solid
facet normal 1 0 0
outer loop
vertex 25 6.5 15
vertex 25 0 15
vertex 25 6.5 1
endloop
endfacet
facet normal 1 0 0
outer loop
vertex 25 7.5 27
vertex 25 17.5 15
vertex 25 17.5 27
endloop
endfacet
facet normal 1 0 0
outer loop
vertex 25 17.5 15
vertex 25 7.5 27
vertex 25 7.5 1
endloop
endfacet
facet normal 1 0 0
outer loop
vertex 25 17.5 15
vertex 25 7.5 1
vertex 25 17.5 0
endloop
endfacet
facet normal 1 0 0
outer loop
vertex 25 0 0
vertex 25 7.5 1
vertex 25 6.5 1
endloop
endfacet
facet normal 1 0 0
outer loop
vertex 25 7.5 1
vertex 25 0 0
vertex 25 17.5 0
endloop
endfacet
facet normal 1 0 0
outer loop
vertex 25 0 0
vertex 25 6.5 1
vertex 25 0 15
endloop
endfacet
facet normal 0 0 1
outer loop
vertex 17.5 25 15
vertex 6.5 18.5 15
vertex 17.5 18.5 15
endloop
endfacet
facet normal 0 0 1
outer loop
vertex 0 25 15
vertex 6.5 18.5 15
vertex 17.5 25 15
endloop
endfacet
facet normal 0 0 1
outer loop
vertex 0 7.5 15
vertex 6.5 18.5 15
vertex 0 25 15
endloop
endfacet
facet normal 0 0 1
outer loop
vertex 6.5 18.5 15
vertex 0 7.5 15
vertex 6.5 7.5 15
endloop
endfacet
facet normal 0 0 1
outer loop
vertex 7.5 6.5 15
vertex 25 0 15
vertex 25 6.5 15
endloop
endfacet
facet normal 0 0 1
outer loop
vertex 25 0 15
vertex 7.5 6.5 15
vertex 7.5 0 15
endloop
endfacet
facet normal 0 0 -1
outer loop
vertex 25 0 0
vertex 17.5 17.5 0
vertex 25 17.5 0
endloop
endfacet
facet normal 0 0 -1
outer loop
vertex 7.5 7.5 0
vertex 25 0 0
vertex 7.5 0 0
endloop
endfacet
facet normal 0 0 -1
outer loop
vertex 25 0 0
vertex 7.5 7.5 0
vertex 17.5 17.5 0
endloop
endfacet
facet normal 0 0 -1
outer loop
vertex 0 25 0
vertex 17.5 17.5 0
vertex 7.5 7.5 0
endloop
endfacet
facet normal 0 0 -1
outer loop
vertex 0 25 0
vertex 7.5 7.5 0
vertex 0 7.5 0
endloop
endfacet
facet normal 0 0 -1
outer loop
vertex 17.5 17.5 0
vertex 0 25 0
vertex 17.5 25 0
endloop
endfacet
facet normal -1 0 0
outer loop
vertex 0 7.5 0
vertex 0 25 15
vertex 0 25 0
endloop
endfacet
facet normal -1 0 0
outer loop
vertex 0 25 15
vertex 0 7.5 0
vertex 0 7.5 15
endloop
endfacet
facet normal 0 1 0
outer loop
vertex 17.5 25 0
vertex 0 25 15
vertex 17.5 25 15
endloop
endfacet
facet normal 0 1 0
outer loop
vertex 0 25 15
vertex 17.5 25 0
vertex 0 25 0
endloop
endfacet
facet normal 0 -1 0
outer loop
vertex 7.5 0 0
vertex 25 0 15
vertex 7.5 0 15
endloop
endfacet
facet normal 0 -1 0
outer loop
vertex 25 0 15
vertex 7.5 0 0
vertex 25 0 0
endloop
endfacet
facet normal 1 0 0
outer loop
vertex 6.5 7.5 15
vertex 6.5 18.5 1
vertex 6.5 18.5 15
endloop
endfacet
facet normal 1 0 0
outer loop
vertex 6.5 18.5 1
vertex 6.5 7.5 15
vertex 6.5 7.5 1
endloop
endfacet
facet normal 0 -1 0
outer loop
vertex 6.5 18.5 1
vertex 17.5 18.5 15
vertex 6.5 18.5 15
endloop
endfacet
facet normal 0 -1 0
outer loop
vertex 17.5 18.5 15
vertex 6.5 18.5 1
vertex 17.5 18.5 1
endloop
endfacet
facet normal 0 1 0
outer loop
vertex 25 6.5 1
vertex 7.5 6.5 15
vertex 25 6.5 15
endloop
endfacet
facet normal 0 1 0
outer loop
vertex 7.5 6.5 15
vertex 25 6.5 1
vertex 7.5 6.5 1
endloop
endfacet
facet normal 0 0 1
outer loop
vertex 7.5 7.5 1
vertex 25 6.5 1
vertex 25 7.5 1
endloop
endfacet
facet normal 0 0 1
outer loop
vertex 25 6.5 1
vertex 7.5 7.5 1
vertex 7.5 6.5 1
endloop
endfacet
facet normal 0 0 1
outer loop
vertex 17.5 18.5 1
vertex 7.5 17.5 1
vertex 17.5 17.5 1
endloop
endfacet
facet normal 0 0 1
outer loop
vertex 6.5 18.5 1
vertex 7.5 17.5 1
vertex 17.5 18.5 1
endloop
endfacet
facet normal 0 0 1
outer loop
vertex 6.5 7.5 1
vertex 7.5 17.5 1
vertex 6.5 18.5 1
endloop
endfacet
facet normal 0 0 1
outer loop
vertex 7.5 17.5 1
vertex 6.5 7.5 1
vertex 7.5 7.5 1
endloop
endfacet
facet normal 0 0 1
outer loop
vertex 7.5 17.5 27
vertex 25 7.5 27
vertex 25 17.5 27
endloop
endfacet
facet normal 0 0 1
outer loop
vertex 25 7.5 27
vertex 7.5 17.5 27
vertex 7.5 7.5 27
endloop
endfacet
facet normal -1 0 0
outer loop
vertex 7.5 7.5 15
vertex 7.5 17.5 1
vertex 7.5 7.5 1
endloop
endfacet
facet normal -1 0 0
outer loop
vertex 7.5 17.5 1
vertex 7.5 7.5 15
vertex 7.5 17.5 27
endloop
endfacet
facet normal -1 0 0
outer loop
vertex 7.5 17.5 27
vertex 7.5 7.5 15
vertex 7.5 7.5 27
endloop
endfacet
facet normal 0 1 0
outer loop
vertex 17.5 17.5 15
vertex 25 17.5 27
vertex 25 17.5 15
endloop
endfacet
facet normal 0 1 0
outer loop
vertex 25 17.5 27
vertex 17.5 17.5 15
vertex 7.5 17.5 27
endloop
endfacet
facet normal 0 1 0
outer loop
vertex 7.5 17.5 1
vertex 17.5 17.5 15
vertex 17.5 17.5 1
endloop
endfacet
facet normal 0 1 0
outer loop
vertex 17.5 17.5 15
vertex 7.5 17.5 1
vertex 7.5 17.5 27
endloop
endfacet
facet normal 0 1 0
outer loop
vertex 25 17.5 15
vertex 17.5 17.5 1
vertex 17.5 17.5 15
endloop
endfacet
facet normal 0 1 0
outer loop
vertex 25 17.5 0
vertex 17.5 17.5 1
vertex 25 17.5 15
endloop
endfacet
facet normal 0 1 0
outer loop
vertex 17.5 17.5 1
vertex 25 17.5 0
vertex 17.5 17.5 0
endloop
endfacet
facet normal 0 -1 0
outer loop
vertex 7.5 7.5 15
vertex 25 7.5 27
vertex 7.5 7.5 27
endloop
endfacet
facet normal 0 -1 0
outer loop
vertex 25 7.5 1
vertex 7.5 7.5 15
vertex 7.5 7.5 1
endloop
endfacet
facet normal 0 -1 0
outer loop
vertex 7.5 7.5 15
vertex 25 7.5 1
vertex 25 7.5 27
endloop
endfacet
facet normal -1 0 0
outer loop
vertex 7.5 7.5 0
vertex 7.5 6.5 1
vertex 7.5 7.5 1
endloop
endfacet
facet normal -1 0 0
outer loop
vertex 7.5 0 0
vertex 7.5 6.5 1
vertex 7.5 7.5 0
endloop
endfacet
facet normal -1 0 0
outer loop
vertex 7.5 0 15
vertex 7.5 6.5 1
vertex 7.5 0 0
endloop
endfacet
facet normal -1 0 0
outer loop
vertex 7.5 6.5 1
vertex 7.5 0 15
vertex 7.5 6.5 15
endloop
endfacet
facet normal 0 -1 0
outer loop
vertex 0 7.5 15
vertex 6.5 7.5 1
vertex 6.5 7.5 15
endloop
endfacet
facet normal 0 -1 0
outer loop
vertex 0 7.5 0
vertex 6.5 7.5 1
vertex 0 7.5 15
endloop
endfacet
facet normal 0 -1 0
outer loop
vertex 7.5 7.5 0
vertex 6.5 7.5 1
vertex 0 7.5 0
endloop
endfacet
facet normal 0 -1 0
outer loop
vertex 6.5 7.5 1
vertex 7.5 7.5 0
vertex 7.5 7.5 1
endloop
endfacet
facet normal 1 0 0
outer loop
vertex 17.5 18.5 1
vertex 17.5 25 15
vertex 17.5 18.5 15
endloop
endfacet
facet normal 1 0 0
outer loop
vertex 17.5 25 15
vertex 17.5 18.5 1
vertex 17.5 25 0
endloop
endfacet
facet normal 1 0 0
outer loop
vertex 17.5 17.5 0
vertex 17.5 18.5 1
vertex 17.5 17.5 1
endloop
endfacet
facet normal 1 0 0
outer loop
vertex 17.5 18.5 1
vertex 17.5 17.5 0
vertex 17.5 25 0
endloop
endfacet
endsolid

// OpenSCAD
$vpt = [ 0, 0, 20 ]; // translation de la vue par défaut
$vpr = [ 55, 0.00, -45 ]; // rotation de la vue par défaut
$vpd = 110;



// En dessous je ne modifie que si je comprends ce que je fais,
// et je demande à un animateur de regarder avec moi

aucentre = 0; O=0;o=O;
enlongueur = 1; C=1;c=C;
danslecoin = 2; V=2;v=V;

gardeles = 0; basecomplete = 0; X=0;x=X;
enleve1coin = 1; unseulcoin = 1; Y=1;y=Y;
enleve2coins = 2; enleve2coin = 2; I=2;i=Y;

taille = 25;
interieur = 10;
hauteur = 30;
base_hauteur = 15;
epaisseur = 0.3;

module base(taille) {
    cube([taille,taille,epaisseur]);
}

module tour(interieur,hauteur,positiondelatour) {
    if (positiondelatour==O) {
        translate([(taille-interieur)/2,(taille-interieur)/2,0])
        cube([interieur,interieur,hauteur]);
    }
    if (positiondelatour==C) {
        translate([(taille-interieur)/2,(taille-interieur)/2,0])
        cube([taille-((taille-interieur)/2),interieur,hauteur]);
    }
    if (positiondelatour==V) {
        translate([(taille-interieur),0,0])
        cube([interieur,interieur,hauteur]);
    }
}

module moat(interieur,positiondelatour) {
    if (positiondelatour==O) {
        translate([(taille-interieur-2)/2,(taille-interieur-2)/2,0])
        cube([interieur+2,interieur+2,base_hauteur]);
    }
    if (positiondelatour==C) {
        translate([(taille-interieur-2)/2,(taille-interieur-2)/2,0])
        cube([taille,interieur+2,base_hauteur]);
    }
    if (positiondelatour==V) {
        translate([(taille-interieur)-2,0,0])
        cube([interieur+2,interieur+2,base_hauteur]);
    }
}

module coin(offset_x,offset_y) {
    translate([offset_x,offset_y,0])
    cube([(taille-interieur)/2,(taille-interieur)/2,base_hauteur]);
}

module base(taille,hauteur) {
    cube([taille,taille,hauteur]);
}

module bloc(positiondelatour,coins,hauteurdelatour, hauteurdelabase) {

    difference() {
        union() {
            base(taille);
            difference() {
                base(taille,min(base_hauteur,hauteurdelabase));
                moat(interieur,positiondelatour);
            }
            tour(interieur,min(hauteur,hauteurdelatour),positiondelatour);
        }
        union() {
            if(coins>X) coin(0,0);
            if(coins>Y) coin(taille-(taille-interieur)/2,taille-(taille-interieur)/2);
        }
    }
}

// Ici c'est mon objet à moi: je peux changer les valeurs après les =

bloc(

// la tour peut être : aucentre, danslecoin ou enlongueur

positiondelatour = enlongueur

,// Je mets gardeles, enleve1coin ou enleve2coins

coins = enleve2coins

,// La hauteur de ma tour entre 0 et 30 mm

hauteurdelatour = 27

,// La hauteur de ma base entre 0 et 15 mm

hauteurdelabase = 15

 );
